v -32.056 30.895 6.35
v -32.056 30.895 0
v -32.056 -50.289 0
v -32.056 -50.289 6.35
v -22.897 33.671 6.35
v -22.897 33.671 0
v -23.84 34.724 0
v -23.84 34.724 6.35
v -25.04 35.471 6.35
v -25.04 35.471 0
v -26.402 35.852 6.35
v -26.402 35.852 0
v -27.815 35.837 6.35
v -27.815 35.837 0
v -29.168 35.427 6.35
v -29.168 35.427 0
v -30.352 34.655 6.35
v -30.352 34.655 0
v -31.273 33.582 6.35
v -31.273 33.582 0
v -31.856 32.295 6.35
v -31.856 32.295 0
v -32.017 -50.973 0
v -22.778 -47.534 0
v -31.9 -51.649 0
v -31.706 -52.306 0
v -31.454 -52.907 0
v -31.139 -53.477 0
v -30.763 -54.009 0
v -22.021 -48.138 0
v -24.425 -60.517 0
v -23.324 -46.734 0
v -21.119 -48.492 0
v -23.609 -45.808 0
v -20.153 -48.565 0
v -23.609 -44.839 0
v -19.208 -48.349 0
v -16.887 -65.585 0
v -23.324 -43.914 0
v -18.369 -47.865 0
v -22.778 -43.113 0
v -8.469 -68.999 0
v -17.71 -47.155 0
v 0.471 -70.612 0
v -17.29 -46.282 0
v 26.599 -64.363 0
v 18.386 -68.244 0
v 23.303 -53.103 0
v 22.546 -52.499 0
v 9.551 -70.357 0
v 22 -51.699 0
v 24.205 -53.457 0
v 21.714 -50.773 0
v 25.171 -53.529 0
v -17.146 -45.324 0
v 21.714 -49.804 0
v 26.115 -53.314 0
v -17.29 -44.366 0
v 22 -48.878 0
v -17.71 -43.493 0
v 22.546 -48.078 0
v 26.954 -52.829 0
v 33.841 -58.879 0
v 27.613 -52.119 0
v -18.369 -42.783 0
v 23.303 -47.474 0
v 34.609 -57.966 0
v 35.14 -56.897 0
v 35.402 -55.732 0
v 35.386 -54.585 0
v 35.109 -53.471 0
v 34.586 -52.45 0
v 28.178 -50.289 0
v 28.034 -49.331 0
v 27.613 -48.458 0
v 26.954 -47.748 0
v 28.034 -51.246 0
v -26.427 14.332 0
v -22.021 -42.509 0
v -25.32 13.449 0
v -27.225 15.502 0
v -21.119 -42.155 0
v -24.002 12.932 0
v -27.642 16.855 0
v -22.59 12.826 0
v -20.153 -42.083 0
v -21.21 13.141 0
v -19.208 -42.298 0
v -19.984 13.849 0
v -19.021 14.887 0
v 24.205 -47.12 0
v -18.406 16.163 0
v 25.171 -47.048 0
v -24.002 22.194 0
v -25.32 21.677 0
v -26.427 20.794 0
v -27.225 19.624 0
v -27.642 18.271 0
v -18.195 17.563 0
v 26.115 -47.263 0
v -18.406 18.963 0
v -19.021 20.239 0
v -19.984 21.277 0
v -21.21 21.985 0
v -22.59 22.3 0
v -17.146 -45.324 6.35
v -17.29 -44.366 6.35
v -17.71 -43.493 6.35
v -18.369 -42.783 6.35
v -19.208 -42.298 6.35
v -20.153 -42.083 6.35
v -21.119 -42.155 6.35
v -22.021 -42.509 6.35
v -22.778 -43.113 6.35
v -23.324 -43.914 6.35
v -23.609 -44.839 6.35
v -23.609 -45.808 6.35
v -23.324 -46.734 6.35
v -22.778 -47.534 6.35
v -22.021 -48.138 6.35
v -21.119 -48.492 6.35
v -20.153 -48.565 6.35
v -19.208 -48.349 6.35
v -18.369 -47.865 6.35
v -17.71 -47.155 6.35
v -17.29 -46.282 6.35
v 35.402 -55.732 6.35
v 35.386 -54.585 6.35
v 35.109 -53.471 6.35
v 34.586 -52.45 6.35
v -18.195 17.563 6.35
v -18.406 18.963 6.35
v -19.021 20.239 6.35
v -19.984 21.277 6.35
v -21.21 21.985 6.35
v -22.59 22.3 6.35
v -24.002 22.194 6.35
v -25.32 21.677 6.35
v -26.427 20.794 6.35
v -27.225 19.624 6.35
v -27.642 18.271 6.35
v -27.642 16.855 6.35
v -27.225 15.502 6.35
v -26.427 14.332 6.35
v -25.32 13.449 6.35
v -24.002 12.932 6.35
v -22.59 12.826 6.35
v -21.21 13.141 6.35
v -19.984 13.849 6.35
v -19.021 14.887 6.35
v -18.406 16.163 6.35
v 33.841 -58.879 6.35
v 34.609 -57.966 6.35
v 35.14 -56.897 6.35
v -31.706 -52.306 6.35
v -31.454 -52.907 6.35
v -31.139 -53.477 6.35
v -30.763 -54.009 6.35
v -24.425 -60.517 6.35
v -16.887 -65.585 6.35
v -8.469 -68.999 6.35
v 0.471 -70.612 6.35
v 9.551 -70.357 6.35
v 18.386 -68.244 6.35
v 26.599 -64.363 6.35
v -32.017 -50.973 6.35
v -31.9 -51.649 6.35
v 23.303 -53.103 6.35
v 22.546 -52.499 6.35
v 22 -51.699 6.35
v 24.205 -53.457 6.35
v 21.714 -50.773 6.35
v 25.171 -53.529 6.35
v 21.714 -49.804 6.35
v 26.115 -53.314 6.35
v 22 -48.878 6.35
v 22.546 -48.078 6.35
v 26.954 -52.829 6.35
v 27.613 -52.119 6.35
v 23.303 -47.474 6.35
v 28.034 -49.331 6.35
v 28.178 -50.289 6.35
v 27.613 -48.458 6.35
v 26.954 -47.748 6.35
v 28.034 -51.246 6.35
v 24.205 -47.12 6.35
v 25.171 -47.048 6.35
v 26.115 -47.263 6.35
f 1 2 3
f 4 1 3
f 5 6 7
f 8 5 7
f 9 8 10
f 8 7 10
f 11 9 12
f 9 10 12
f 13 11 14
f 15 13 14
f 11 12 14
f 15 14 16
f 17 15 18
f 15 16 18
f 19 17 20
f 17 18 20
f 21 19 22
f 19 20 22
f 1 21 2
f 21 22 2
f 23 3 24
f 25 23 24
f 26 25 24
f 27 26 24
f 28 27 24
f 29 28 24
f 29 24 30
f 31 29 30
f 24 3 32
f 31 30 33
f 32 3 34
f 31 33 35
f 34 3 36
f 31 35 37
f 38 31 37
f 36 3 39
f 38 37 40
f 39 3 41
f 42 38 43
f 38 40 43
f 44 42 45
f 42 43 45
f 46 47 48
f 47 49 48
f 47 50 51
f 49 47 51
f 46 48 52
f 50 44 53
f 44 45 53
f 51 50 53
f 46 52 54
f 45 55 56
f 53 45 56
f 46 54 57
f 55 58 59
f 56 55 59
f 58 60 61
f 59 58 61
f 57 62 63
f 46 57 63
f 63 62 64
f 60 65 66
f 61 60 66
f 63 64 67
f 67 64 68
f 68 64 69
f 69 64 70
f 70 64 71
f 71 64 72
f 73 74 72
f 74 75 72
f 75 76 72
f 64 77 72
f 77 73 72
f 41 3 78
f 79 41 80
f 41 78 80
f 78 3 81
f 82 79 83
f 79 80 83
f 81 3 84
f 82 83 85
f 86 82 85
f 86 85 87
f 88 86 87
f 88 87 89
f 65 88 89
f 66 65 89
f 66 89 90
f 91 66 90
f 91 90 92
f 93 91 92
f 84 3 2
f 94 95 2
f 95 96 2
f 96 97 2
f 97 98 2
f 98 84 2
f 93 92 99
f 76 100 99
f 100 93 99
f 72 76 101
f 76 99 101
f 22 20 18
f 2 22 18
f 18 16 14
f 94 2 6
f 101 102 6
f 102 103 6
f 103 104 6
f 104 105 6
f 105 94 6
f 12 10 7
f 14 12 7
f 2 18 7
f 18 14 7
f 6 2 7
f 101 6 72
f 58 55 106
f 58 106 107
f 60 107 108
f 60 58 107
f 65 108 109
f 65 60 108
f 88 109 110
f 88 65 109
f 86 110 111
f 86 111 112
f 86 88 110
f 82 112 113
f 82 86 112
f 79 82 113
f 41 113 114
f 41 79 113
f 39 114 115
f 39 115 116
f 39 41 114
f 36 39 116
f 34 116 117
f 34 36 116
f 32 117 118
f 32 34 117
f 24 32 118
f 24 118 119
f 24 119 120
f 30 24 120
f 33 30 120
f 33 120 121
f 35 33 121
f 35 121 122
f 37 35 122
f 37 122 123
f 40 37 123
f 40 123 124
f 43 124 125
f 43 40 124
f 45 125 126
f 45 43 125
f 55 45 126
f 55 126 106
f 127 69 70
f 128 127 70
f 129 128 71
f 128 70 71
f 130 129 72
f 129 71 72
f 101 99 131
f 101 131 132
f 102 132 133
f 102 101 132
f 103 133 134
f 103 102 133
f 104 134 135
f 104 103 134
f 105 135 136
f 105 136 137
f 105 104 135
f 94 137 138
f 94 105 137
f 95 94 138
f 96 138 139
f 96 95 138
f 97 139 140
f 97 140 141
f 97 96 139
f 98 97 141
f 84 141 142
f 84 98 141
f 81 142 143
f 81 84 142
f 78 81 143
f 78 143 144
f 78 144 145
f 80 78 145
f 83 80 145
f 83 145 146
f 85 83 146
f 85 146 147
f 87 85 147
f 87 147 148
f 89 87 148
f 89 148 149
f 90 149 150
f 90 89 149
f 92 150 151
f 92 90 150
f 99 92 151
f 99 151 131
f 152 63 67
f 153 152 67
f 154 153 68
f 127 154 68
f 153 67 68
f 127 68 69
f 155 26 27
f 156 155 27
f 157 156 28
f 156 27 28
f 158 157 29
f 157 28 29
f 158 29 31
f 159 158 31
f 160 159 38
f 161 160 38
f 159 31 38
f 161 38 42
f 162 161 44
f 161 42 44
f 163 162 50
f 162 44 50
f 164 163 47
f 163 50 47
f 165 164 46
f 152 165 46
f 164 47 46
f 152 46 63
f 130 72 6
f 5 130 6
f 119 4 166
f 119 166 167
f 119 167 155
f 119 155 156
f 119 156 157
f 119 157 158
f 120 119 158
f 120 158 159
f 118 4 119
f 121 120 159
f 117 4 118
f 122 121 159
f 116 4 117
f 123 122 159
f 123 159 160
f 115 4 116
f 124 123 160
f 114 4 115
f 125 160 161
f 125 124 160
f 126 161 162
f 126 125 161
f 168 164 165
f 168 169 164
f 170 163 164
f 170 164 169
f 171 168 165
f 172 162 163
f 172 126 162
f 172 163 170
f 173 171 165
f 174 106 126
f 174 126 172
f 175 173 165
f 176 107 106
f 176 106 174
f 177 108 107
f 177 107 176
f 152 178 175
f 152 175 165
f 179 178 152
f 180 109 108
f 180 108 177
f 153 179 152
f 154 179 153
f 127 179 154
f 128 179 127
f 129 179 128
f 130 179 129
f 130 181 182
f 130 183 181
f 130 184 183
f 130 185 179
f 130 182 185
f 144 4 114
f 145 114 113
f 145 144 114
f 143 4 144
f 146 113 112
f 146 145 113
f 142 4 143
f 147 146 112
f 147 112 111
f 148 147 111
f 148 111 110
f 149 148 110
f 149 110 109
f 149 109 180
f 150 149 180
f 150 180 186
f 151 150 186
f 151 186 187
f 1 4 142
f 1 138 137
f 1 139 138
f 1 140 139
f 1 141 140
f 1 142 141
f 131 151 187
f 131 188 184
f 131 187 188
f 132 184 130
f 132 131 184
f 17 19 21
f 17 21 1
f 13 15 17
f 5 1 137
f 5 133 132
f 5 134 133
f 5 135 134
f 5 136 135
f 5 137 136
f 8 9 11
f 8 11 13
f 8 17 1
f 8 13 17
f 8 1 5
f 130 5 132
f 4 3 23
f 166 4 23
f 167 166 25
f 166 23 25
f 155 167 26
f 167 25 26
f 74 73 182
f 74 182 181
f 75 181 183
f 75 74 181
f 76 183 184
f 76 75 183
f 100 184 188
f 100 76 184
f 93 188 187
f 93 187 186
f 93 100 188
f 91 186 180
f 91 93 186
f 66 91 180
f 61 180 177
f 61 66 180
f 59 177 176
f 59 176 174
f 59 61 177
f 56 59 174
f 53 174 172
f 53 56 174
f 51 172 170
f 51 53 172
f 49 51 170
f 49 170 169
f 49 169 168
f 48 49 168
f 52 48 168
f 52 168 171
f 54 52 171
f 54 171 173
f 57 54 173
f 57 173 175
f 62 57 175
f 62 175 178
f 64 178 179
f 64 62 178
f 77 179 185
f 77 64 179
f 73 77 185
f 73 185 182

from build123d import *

# Parameters (mm, degrees)
F0_R     = 3.25
F0_R_2   = 4.75
F1_DEPTH = 6.35


# Not quite as in the source:
# - a length typed as a fraction of an inch, garbled in the dataset ("3 / 203.2 mm" for 3/8 in), is restored


with BuildPart() as f1:
    # F0 (on Top) → F1 (new body)
    with BuildSketch(Plane.XY):
        with BuildLine():
            ThreePointArc((-22.8971660057, 33.6711986684), (-28.5061254625, 35.6804376948), (-32.0558722278, 30.8953812108))
            Line((-32.0558722278, 30.8953812108), (-32.0558722278, -50.2885361405))
            ThreePointArc((-32.0558722278, -50.2885361405), (-31.9678509198, -51.3125029104), (-31.7063695792, -52.3064260488))
            Line((-31.7063695792, -52.3064260488), (35.4015681706, -55.732164864))
            ThreePointArc((35.4015681706, -55.732164864), (35.2797878973, -54.0198372397), (34.5860178433, -52.4496208725))
            Line((34.5860178433, -52.4496208725), (-22.8971660057, 33.6711986684))
        make_face()
        with Locations((-20.3956849873, -45.3237444162)):
            Circle(F0_R, mode=Mode.SUBTRACT)
        with Locations((24.9280557036, -50.2885361405)):
            Circle(F0_R, mode=Mode.SUBTRACT)
        with Locations((-22.9451451451, 17.56295003)):
            Circle(F0_R_2, mode=Mode.SUBTRACT)
        with BuildLine():
            Line((35.4015681706, -55.732164864), (-31.7063695792, -52.3064260488))
            ThreePointArc((-31.7063695792, -52.3064260488), (-31.3042287593, -53.1962420607), (-30.763080876, -54.0090450764))
            ThreePointArc((-30.763080876, -54.0090450764), (0.4708891197, -70.6124039736), (33.840882919, -58.8788656243))
            ThreePointArc((33.840882919, -58.8788656243), (34.9066358356, -57.4470716441), (35.4015681706, -55.732164864))
        make_face()
    extrude(amount=F1_DEPTH)


solid = f1.part
